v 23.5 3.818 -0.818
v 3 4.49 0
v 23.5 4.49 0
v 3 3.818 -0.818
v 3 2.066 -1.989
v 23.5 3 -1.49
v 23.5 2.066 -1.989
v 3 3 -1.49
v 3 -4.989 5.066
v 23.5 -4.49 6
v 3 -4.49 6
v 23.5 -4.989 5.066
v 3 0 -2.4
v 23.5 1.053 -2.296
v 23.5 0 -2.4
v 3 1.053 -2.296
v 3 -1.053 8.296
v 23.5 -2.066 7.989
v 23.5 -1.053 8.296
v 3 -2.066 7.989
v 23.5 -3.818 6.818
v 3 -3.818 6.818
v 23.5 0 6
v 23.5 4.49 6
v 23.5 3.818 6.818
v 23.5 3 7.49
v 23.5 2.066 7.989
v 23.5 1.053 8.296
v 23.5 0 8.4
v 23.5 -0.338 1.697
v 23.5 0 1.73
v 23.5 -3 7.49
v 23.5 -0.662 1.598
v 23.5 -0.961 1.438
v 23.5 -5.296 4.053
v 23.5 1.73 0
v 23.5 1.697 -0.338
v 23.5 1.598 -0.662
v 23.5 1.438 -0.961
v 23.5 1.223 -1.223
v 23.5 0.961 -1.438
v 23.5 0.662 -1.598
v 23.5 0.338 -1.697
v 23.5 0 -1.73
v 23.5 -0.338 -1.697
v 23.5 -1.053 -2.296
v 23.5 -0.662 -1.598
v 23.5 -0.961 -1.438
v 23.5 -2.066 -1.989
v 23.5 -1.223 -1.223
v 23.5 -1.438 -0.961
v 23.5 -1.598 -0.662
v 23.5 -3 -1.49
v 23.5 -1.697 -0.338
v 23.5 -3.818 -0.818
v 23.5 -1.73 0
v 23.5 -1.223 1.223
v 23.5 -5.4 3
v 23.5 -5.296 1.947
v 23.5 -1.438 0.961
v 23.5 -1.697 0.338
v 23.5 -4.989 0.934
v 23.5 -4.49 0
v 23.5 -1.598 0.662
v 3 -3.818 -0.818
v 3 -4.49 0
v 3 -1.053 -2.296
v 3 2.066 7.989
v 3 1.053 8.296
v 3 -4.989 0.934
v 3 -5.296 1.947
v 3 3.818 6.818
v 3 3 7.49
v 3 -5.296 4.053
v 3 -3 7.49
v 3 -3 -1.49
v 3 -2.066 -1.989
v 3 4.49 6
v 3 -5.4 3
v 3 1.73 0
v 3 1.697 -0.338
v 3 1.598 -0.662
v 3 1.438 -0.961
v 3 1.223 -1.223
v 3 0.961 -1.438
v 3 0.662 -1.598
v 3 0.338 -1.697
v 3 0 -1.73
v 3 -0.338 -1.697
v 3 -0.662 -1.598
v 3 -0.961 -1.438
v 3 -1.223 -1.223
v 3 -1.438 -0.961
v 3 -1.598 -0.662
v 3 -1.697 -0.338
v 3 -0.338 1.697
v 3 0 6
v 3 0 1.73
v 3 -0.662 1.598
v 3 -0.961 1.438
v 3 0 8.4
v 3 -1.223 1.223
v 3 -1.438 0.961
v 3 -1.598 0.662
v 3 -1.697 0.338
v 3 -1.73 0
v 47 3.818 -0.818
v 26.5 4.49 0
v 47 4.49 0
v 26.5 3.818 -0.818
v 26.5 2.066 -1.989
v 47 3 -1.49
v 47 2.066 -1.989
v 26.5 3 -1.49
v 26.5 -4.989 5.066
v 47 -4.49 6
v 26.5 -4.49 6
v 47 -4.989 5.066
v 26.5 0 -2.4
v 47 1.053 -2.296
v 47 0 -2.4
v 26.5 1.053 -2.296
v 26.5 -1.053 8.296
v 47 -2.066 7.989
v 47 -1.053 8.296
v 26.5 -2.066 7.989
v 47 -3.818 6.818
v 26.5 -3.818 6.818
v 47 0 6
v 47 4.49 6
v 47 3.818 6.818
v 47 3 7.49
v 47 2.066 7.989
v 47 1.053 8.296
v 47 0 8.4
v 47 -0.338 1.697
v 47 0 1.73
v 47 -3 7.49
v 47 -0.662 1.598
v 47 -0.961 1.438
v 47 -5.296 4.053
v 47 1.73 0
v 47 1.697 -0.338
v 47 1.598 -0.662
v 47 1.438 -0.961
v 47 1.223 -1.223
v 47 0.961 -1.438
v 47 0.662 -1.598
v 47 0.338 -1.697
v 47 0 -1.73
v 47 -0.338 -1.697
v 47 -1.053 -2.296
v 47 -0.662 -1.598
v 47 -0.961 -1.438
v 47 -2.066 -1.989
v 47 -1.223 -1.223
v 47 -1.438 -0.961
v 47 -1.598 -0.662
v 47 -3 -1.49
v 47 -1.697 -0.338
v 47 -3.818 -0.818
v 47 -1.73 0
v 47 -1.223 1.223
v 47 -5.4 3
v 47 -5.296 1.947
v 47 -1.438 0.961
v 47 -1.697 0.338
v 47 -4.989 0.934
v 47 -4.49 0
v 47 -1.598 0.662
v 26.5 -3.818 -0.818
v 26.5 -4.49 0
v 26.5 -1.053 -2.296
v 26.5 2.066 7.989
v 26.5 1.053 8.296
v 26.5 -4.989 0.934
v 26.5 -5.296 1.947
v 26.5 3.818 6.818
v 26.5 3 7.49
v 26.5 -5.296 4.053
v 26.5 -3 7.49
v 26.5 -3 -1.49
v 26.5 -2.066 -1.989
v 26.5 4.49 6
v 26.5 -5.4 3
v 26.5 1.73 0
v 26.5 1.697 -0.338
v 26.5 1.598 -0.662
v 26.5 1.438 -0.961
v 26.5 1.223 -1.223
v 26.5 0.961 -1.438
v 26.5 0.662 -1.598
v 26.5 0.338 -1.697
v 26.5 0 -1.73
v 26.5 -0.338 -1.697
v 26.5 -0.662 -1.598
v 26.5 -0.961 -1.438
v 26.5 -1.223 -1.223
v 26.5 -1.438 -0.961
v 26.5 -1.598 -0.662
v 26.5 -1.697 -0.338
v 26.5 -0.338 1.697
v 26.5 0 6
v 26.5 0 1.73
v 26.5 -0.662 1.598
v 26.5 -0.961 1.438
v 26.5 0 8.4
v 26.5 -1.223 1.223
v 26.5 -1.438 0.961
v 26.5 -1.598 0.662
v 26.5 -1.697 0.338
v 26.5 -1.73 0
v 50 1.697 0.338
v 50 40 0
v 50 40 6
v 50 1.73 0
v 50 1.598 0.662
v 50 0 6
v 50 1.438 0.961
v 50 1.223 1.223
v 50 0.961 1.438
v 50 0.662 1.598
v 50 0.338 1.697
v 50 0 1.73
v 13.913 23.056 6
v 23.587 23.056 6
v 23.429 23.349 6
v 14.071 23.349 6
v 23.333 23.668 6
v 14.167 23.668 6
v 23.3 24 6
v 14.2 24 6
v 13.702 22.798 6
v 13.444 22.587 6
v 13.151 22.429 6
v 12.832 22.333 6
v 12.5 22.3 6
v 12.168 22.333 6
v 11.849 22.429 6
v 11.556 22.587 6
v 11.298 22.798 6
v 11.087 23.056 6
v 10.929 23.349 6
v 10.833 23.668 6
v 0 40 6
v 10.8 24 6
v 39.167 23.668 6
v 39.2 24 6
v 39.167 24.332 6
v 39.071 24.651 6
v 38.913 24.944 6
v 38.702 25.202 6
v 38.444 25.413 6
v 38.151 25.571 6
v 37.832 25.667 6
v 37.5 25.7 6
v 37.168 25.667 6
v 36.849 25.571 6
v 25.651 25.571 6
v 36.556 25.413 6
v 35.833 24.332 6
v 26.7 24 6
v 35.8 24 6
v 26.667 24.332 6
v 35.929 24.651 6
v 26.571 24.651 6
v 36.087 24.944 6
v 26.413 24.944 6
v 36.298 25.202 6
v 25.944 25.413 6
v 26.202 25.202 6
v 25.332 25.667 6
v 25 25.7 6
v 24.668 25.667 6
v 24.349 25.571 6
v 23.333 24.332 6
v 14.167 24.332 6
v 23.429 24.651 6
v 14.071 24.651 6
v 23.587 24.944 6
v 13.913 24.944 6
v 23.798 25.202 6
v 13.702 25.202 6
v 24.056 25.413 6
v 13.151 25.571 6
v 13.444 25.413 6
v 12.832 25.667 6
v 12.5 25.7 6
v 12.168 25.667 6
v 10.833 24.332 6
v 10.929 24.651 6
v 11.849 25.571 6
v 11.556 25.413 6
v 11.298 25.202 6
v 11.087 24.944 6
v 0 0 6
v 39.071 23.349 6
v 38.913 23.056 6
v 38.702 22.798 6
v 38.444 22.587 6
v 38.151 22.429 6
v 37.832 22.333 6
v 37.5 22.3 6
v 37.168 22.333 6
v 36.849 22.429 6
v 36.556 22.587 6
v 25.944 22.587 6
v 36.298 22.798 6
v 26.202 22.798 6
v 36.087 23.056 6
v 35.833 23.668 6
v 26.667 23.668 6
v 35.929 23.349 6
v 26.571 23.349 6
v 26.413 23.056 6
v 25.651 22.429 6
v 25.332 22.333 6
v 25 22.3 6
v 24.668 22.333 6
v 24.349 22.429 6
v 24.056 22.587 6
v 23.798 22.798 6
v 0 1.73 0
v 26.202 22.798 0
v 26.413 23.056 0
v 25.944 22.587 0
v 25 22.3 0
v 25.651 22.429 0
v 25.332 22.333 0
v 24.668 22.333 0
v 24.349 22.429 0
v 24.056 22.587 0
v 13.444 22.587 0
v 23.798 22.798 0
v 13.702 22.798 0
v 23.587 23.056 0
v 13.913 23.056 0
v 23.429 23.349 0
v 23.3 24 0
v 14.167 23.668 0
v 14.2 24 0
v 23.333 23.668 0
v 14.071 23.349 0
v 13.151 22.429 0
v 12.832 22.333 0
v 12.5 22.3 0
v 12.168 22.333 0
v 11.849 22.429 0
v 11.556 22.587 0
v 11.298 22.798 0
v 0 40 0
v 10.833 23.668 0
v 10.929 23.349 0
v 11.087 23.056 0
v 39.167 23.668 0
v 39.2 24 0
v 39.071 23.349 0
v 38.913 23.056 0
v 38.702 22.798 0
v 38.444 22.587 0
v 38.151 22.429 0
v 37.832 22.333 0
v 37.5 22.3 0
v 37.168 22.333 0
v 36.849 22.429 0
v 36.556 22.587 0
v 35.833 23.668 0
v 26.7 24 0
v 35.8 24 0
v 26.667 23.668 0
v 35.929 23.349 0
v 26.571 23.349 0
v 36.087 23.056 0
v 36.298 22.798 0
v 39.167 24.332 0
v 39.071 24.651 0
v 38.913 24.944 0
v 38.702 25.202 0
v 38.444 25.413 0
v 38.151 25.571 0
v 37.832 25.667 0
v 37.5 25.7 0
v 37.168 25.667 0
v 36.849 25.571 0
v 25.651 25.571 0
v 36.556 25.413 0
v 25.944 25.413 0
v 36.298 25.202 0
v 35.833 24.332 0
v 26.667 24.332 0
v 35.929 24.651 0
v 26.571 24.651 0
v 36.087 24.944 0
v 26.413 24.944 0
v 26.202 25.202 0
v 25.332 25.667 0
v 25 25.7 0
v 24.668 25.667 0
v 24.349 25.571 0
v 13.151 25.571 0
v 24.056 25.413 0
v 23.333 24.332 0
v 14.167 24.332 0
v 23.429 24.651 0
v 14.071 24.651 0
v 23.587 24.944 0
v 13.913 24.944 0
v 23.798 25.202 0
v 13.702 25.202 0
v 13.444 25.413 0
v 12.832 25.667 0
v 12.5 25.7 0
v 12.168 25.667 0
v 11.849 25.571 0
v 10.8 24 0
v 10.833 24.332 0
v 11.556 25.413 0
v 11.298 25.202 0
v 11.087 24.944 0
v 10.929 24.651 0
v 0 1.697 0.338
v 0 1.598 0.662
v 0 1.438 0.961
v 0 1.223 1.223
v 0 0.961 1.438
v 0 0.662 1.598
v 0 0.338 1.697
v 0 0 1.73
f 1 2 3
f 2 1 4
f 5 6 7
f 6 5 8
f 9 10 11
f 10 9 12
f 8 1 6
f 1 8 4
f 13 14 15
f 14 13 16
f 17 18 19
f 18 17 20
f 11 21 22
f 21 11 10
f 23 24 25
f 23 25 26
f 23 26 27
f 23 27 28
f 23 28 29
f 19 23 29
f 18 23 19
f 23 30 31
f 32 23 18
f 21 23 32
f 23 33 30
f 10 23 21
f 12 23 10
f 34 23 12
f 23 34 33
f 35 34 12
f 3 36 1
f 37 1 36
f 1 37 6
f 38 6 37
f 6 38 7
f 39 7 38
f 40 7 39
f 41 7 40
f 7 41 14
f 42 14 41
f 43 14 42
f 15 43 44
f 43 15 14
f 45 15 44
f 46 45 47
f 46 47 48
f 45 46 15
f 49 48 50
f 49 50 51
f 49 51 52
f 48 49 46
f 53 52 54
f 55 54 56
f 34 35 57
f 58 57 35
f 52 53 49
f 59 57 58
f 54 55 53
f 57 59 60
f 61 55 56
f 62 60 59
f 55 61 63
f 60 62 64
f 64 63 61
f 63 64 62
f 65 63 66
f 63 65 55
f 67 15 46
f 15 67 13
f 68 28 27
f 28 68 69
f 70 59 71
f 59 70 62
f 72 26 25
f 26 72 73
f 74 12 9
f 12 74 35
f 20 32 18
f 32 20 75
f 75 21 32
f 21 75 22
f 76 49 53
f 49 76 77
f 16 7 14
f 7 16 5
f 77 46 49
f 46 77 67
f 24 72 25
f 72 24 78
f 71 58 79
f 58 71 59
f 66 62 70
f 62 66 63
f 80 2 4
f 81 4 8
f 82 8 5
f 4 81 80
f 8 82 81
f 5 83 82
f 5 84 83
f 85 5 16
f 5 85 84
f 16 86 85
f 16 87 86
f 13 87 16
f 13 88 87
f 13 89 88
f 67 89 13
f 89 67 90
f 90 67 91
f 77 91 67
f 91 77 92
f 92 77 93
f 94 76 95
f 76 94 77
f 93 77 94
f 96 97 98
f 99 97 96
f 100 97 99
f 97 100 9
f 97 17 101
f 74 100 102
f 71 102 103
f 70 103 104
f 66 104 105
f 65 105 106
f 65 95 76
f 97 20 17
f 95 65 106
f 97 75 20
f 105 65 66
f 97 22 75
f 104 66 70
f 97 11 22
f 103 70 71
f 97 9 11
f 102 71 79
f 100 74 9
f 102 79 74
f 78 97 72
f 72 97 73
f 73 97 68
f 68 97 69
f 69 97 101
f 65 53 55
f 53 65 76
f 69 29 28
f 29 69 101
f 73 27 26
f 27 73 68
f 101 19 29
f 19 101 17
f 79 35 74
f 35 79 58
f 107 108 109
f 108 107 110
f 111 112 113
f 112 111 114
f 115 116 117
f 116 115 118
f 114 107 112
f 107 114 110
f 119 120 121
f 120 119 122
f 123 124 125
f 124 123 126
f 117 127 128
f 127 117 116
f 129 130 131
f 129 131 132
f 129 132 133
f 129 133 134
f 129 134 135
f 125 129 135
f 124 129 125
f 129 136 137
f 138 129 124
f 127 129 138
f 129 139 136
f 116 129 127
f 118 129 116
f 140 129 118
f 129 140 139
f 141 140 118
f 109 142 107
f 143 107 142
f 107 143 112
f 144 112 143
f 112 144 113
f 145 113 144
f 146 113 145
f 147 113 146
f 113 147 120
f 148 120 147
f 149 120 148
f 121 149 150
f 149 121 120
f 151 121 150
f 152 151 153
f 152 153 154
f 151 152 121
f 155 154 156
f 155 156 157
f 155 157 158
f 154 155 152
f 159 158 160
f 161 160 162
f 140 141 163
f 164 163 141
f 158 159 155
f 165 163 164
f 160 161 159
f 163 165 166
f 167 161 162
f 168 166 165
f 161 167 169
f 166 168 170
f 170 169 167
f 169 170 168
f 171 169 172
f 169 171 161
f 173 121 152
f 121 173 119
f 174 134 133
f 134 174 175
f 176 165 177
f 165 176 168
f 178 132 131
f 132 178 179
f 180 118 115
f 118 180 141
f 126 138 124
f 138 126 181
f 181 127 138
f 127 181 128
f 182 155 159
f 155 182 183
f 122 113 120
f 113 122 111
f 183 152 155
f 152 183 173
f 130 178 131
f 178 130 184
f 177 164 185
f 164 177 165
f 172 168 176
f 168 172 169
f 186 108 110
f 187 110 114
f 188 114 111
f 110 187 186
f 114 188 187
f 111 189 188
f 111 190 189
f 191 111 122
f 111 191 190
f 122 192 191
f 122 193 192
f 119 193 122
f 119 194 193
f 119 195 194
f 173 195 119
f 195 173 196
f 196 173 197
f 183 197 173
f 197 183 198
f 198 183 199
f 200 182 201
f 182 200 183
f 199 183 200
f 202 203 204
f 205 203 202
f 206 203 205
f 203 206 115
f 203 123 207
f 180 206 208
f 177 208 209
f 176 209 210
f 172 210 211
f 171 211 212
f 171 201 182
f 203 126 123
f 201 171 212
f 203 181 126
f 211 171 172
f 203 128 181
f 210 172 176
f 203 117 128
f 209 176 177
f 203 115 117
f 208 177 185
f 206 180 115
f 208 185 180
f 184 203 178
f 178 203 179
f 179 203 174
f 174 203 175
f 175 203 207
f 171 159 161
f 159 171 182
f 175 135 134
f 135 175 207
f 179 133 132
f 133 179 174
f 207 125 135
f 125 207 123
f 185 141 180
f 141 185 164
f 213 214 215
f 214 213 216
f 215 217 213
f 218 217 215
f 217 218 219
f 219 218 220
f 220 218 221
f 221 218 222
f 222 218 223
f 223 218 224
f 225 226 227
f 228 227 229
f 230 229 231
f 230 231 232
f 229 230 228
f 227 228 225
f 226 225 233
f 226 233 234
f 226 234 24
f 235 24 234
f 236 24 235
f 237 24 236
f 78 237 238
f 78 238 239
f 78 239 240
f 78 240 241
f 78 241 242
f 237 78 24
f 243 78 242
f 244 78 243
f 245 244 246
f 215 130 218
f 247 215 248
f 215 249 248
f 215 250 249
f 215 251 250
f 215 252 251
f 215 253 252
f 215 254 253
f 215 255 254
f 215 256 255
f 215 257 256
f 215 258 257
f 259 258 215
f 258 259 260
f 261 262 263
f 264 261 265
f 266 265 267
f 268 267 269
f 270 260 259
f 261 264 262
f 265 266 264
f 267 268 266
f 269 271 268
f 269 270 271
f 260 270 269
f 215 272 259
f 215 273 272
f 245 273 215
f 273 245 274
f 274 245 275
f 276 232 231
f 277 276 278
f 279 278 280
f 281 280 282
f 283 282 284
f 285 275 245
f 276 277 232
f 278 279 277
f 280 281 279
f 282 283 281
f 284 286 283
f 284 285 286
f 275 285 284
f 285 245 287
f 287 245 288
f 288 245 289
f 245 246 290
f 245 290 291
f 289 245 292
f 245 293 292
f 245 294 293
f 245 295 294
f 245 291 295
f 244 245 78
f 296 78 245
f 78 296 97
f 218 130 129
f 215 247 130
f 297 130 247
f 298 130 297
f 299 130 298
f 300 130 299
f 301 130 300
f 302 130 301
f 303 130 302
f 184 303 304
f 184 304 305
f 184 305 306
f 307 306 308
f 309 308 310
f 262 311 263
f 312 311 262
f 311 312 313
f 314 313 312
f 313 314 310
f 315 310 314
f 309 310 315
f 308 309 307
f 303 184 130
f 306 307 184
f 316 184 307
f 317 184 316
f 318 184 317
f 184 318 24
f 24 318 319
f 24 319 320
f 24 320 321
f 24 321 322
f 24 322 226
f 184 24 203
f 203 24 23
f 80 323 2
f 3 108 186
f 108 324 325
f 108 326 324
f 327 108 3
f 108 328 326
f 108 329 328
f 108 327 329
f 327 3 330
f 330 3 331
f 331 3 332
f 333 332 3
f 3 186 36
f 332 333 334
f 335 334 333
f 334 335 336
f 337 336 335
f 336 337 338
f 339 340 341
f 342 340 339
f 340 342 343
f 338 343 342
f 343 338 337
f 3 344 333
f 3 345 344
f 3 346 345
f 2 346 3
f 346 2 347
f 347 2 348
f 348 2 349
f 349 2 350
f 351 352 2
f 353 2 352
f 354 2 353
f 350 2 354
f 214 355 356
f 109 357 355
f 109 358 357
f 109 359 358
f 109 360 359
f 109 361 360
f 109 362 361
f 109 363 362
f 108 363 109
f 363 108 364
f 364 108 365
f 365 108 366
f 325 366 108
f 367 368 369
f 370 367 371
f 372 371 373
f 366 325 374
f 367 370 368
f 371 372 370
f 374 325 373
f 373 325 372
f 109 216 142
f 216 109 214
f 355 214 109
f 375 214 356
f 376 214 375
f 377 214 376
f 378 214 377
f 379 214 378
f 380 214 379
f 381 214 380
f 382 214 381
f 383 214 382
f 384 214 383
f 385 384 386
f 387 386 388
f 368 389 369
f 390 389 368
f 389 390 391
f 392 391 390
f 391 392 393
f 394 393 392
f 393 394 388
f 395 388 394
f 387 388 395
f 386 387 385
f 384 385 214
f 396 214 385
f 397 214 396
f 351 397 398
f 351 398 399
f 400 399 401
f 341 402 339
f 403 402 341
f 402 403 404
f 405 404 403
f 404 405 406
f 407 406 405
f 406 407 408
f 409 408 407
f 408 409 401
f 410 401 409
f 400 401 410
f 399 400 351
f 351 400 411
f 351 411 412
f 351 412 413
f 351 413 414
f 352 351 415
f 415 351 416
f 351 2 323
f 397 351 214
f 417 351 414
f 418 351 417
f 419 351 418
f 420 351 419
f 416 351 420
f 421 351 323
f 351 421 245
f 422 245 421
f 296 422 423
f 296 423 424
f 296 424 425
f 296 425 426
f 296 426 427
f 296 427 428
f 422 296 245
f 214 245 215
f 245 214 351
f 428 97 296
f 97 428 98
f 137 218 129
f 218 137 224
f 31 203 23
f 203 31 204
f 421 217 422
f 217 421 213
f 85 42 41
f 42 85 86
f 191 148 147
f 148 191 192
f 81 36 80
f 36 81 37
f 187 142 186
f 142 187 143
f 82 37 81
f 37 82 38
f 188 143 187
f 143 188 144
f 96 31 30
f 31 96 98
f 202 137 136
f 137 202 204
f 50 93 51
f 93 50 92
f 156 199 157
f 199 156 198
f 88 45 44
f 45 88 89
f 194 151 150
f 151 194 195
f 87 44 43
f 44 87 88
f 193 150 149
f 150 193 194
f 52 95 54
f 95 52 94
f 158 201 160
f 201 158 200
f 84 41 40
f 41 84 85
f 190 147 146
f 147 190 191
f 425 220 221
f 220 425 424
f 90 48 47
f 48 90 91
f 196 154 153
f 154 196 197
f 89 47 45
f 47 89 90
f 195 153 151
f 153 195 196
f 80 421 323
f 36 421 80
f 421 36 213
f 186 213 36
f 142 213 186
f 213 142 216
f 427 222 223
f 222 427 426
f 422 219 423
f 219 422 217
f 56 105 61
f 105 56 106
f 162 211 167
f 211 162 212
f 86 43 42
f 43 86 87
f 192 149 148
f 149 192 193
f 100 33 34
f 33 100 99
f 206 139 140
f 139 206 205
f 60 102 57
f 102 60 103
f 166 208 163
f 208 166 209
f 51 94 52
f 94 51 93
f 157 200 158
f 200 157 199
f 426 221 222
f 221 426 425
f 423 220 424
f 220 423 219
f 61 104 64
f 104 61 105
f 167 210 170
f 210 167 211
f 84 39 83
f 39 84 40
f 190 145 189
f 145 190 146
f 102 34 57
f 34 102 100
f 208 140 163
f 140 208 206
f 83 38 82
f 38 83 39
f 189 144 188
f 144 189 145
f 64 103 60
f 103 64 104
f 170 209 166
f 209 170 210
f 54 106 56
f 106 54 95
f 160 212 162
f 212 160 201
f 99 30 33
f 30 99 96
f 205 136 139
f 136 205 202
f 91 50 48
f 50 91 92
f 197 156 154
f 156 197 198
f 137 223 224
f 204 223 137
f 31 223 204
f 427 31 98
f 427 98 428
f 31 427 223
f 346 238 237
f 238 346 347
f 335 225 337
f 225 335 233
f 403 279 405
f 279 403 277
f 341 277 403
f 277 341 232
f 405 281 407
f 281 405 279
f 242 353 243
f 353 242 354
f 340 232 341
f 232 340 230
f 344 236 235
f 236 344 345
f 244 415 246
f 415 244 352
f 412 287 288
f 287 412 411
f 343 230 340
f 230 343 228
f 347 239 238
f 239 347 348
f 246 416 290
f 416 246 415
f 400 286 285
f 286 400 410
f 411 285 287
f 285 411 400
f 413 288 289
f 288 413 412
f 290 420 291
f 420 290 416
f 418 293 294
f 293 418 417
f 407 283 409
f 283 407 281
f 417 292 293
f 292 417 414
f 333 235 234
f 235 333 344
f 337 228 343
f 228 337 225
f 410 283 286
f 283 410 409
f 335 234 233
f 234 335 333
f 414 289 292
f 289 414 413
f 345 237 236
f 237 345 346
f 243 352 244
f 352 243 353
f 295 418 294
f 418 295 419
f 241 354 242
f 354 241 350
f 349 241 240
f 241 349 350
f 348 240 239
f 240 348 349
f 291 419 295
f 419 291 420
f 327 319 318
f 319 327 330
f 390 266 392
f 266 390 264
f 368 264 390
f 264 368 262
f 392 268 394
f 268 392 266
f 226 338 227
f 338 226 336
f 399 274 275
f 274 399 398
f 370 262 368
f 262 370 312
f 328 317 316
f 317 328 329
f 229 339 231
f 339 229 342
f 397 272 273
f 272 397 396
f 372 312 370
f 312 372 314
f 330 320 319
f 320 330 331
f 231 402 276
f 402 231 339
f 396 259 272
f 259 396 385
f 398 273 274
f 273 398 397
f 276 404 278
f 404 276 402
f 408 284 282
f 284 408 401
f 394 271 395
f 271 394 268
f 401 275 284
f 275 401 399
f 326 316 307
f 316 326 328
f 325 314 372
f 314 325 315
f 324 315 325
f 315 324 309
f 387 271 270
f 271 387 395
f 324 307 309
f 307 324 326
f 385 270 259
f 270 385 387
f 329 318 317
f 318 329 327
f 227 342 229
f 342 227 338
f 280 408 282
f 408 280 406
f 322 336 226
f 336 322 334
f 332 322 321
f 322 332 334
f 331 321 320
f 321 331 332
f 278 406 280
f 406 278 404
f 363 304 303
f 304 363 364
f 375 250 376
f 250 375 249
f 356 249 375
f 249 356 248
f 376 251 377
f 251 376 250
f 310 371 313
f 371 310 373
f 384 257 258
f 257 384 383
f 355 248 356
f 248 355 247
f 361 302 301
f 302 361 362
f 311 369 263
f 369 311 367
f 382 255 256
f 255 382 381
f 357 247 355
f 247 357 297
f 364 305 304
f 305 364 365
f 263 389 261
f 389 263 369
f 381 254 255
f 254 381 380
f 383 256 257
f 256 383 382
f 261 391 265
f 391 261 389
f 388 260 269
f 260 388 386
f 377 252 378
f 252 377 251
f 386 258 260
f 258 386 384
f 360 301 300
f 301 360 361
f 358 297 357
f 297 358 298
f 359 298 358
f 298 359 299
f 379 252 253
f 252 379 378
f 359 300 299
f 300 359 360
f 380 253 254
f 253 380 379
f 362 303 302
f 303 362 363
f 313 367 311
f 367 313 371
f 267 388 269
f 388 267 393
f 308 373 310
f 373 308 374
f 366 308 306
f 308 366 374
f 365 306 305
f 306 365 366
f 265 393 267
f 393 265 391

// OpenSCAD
$fn = 32;

// ----------------------------------------------------------------------
// Hinge leaf: 50 x 45.4 x 10.8 mm
// ----------------------------------------------------------------------

// --- parameters (mm) ---
leaf_len = 50;            // leaf length, X
leaf_w = 40;              // leaf width, Y
leaf_t = 6;               // leaf thickness
knuckle_d = 10.8;         // knuckle diameter
knuckle_w = 20.5;         // knuckle width
knuckle_n = 2;            // number of knuckles
pin_d = 3.46;             // pin bore
gap = 3;                  // gap between the knuckles
screw_d = 3.4;            // screw clearance

module leaf() {
  cube([leaf_len, leaf_w, leaf_t]);
}

module knuckles() {
  /* barrels sit on the leaf edge, the pin axis at half the leaf thickness */
  for (i = [0 : knuckle_n - 1])
    translate([gap + i * (knuckle_w + gap), 0, leaf_t * 0.5])
      rotate([0, 90, 0]) cylinder(h = knuckle_w, d = knuckle_d);
}

difference() {
  union() {
    leaf();
    knuckles();
  }
  rotate([0, 90, 0]) translate([0, 0, -1])
    cylinder(h = leaf_len + 2, d = pin_d);
  translate([12.5, leaf_w * 0.6, -1]) cylinder(h = leaf_t + 2, d = screw_d);
  translate([25, leaf_w * 0.6, -1]) cylinder(h = leaf_t + 2, d = screw_d);
  translate([37.5, leaf_w * 0.6, -1]) cylinder(h = leaf_t + 2, d = screw_d);
}
